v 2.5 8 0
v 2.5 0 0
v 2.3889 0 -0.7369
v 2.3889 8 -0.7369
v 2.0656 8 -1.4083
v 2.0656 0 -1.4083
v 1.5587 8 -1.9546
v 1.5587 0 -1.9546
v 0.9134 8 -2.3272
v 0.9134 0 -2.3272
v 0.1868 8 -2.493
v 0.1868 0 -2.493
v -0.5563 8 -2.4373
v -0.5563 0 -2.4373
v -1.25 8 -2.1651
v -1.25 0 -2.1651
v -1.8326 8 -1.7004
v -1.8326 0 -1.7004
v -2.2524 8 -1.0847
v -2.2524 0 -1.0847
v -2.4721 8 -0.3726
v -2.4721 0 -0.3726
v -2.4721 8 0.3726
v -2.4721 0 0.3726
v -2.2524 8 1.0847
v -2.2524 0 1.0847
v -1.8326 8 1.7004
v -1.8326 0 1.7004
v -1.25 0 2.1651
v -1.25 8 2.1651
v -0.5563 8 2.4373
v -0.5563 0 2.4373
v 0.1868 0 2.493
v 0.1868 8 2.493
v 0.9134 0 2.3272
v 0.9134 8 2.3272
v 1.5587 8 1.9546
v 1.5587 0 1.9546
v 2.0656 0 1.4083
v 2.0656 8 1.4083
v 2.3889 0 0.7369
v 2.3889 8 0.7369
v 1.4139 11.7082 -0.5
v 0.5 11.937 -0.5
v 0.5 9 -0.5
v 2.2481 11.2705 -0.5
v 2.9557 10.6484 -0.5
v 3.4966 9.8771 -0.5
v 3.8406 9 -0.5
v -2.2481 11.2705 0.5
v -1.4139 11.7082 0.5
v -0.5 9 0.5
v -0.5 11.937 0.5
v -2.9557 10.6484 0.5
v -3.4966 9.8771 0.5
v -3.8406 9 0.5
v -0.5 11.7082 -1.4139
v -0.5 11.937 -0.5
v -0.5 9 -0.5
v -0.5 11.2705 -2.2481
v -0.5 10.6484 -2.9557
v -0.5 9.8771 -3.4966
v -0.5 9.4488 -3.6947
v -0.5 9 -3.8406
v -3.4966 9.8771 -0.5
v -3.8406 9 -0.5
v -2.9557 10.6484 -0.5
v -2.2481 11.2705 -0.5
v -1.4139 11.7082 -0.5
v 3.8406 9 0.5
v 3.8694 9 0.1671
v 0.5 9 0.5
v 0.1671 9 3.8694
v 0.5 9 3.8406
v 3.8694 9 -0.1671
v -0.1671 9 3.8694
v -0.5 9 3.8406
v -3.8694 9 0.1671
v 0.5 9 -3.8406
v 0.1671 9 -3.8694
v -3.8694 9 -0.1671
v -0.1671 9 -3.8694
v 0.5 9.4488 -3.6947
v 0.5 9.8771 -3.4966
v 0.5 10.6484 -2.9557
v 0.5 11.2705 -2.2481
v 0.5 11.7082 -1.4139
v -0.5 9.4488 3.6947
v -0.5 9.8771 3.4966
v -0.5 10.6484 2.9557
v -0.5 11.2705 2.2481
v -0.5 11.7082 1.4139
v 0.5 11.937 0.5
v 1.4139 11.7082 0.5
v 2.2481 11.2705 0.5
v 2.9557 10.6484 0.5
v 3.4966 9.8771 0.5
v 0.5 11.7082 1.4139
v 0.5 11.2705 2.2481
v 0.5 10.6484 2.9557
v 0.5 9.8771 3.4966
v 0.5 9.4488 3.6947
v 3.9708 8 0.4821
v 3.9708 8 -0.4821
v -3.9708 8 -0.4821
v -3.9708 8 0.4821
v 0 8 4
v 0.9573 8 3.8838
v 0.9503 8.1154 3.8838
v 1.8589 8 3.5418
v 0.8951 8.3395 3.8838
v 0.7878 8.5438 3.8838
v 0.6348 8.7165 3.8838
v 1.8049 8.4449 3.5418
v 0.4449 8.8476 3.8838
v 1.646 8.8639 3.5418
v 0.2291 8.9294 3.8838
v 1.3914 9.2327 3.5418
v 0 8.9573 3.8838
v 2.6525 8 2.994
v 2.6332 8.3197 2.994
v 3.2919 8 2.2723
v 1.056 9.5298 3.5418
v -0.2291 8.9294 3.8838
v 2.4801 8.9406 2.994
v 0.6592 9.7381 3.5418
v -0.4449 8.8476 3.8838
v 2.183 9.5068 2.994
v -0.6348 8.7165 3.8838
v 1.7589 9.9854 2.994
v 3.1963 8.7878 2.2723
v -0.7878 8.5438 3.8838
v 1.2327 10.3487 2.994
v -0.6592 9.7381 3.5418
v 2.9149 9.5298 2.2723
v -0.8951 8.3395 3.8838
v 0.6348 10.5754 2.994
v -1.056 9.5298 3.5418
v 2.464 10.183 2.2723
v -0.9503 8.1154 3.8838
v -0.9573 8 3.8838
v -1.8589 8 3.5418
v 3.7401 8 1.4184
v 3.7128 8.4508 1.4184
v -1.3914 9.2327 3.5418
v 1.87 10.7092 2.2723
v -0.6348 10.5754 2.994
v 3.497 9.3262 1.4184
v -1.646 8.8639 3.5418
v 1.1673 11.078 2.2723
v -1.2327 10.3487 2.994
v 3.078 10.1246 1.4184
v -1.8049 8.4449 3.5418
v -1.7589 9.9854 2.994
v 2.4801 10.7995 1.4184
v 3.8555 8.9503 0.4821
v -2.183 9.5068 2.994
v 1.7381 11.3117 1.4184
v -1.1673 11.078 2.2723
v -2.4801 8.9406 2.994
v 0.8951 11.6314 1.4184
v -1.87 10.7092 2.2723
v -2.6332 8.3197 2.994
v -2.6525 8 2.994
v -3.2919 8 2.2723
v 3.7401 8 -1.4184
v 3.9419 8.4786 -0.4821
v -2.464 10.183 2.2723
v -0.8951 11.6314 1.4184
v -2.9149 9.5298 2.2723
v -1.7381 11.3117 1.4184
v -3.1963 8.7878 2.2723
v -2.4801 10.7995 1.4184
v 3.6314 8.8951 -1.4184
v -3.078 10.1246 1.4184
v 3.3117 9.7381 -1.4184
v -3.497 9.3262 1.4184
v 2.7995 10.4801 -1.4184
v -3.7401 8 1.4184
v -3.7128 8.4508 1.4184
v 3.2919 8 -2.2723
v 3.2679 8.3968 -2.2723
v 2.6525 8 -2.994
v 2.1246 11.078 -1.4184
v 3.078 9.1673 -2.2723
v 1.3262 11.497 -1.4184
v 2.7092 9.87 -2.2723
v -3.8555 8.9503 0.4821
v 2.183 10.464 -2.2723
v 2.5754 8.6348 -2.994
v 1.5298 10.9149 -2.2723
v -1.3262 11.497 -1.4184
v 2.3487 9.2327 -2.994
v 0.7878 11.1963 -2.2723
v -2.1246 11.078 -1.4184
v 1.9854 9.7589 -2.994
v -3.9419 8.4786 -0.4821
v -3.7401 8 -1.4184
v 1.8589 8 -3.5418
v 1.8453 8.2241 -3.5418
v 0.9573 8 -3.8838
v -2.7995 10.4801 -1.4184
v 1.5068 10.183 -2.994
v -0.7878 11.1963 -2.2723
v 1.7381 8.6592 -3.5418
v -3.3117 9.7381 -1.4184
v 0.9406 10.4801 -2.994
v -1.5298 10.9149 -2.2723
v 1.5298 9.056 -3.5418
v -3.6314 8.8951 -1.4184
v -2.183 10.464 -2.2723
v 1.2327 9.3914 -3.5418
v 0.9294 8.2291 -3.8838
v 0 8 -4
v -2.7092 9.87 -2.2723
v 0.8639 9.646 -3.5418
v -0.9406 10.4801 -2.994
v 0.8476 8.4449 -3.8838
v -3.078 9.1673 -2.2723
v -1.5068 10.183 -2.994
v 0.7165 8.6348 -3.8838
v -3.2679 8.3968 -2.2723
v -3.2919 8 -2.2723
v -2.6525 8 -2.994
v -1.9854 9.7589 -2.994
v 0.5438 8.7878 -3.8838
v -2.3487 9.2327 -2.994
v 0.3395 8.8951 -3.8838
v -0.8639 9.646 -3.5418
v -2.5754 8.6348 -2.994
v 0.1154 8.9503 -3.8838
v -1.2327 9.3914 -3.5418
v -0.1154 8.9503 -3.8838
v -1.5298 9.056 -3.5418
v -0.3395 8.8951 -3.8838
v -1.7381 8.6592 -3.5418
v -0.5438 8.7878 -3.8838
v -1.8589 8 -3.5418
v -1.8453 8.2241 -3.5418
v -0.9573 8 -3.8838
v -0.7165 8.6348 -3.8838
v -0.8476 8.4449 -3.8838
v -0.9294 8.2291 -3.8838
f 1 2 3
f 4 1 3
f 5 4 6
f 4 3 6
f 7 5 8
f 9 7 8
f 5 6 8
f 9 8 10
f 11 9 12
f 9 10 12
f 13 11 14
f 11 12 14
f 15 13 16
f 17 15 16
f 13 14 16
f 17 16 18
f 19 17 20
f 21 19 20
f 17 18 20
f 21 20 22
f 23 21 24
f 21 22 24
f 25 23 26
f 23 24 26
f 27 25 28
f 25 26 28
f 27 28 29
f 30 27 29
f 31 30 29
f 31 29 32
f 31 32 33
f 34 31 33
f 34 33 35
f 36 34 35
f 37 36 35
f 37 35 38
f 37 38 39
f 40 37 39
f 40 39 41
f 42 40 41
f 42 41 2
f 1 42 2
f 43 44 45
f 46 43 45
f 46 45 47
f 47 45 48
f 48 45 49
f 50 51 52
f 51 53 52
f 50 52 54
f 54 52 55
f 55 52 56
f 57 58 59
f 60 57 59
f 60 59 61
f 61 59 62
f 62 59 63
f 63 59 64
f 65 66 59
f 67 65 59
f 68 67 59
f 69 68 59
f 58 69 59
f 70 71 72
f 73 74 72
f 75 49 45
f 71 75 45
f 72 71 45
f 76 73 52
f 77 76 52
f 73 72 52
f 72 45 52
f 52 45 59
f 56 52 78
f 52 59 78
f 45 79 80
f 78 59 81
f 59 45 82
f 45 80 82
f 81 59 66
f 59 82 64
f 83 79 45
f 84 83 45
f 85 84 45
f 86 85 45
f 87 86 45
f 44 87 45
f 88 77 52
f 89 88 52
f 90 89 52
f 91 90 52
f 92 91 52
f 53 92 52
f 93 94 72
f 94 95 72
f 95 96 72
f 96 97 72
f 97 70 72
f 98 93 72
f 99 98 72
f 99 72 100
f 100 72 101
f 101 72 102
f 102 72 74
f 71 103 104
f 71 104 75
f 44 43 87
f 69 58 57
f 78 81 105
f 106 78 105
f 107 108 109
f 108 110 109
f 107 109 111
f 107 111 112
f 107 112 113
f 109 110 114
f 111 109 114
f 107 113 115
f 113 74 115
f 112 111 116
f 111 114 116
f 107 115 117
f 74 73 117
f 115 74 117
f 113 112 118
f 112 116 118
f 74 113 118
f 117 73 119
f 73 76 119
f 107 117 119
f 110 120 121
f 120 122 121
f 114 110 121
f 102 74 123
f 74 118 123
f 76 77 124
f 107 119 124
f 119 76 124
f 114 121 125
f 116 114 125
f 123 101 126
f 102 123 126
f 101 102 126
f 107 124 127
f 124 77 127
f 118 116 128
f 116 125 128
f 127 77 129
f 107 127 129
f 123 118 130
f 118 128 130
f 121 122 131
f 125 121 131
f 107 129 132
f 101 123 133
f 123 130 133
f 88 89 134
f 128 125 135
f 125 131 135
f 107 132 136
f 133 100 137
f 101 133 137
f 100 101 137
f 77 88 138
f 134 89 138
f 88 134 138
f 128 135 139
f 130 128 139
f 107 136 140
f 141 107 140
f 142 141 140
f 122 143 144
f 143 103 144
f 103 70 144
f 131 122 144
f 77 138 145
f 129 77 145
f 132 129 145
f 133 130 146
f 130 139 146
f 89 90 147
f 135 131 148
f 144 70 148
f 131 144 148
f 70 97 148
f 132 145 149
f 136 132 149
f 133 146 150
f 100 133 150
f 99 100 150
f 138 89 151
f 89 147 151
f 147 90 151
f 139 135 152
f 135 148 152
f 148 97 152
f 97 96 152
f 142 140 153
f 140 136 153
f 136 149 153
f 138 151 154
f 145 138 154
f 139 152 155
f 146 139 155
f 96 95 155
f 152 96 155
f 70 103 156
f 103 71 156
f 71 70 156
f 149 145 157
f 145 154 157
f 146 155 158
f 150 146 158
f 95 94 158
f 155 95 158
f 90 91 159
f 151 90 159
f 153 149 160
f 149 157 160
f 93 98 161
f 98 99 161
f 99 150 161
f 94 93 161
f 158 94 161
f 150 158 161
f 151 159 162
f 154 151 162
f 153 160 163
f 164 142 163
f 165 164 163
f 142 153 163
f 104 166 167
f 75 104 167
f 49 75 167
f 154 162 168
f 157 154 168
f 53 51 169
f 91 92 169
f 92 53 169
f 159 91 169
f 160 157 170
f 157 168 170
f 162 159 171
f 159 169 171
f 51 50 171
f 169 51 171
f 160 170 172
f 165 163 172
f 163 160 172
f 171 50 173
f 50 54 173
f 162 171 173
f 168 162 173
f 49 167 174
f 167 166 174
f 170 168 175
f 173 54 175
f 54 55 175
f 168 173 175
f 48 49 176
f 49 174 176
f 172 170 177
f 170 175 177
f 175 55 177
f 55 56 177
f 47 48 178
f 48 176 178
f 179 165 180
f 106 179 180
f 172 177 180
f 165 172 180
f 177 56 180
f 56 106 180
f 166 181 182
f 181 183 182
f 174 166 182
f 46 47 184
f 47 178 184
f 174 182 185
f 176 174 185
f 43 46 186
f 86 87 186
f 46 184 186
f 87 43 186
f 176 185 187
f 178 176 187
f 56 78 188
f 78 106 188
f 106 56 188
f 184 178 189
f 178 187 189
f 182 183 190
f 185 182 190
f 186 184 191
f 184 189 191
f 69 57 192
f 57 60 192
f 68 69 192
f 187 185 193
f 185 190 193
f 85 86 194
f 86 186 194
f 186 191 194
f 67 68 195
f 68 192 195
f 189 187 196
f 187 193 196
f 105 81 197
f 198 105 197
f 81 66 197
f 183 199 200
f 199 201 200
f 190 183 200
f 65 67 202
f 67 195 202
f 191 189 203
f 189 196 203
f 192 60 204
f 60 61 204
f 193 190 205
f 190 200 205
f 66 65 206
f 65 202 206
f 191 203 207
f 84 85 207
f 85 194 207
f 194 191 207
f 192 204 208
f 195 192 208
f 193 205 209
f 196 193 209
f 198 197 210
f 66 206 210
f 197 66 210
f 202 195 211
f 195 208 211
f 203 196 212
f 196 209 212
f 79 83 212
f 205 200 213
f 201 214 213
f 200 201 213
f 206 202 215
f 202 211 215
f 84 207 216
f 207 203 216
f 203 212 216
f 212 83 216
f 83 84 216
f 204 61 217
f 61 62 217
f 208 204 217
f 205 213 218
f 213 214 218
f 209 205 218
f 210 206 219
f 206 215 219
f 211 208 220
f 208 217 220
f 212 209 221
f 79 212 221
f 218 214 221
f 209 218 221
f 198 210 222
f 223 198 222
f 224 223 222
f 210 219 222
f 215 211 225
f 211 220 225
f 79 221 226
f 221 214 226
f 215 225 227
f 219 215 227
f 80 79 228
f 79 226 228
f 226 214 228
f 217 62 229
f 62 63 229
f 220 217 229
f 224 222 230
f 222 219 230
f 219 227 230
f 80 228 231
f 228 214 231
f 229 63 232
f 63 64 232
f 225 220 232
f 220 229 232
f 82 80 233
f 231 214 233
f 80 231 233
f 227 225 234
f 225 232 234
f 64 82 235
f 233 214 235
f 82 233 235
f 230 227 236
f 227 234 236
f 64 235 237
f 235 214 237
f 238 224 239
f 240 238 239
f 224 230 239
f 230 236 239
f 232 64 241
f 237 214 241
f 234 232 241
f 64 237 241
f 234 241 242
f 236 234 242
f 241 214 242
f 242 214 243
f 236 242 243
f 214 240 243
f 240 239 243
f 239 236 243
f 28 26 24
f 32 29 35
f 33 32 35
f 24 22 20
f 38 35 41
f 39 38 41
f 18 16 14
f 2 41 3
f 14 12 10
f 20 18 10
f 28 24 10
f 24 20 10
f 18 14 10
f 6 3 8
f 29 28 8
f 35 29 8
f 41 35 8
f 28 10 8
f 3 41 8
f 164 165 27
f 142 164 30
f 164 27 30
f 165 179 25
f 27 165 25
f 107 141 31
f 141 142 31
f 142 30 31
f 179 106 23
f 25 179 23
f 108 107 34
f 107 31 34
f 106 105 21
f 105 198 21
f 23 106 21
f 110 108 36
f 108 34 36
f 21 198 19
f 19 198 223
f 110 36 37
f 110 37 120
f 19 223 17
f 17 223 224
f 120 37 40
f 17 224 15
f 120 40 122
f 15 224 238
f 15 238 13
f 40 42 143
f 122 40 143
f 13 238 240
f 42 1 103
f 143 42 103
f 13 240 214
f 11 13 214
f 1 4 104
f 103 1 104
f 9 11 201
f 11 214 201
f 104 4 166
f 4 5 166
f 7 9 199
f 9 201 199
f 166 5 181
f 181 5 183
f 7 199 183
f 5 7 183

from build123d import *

# Parameters (mm, degrees)
SKETCH1_R           = 2.5
BOSS_EXTRUDE1_DEPTH = 8
REVOLVE1_ANGLE      = 180
CUT_EXTRUDE1_DEPTH  = 3


with BuildPart() as part:
    # Sketch1 → Boss-Extrude1 (new body)
    with BuildSketch(Plane(origin=(0, 0, 0), x_dir=(1, 0, 0), z_dir=(0, 1, 0))):
        Circle(SKETCH1_R)
    extrude(amount=BOSS_EXTRUDE1_DEPTH)

    # Sketch2 → Revolve1 (revolve)
    with BuildSketch(Plane(origin=(0, 8, 0), x_dir=(1, 0, 0), z_dir=(0, 1, 0))):
        with BuildLine():
            Line((0, 4), (0, -4))
            ThreePointArc((0, -4), (4, 0), (0, 4))
        make_face()
    revolve(axis=Axis((0, 8, -4), (0, 0, 1)), revolution_arc=REVOLVE1_ANGLE)

    # Sketch3 → Cut-Extrude1 (cut)
    with BuildSketch(Plane(origin=(0, 9, 0), x_dir=(1, 0, 0), z_dir=(0, 1, 0))):
        Polygon((0.5, 0.5), (5.630024771, 0.5), (5.630024771, -0.5), (0.5, -0.5), (0.5, -4.833323152), (-0.5, -4.833323152), (-0.5, -0.5), (-4.833323152, -0.5), (-4.833323152, 0.5), (-0.5, 0.5), (-0.5, 4.673982829), (0.5, 4.673982829), align=None)
    extrude(amount=CUT_EXTRUDE1_DEPTH, mode=Mode.SUBTRACT)


solid = part.part
